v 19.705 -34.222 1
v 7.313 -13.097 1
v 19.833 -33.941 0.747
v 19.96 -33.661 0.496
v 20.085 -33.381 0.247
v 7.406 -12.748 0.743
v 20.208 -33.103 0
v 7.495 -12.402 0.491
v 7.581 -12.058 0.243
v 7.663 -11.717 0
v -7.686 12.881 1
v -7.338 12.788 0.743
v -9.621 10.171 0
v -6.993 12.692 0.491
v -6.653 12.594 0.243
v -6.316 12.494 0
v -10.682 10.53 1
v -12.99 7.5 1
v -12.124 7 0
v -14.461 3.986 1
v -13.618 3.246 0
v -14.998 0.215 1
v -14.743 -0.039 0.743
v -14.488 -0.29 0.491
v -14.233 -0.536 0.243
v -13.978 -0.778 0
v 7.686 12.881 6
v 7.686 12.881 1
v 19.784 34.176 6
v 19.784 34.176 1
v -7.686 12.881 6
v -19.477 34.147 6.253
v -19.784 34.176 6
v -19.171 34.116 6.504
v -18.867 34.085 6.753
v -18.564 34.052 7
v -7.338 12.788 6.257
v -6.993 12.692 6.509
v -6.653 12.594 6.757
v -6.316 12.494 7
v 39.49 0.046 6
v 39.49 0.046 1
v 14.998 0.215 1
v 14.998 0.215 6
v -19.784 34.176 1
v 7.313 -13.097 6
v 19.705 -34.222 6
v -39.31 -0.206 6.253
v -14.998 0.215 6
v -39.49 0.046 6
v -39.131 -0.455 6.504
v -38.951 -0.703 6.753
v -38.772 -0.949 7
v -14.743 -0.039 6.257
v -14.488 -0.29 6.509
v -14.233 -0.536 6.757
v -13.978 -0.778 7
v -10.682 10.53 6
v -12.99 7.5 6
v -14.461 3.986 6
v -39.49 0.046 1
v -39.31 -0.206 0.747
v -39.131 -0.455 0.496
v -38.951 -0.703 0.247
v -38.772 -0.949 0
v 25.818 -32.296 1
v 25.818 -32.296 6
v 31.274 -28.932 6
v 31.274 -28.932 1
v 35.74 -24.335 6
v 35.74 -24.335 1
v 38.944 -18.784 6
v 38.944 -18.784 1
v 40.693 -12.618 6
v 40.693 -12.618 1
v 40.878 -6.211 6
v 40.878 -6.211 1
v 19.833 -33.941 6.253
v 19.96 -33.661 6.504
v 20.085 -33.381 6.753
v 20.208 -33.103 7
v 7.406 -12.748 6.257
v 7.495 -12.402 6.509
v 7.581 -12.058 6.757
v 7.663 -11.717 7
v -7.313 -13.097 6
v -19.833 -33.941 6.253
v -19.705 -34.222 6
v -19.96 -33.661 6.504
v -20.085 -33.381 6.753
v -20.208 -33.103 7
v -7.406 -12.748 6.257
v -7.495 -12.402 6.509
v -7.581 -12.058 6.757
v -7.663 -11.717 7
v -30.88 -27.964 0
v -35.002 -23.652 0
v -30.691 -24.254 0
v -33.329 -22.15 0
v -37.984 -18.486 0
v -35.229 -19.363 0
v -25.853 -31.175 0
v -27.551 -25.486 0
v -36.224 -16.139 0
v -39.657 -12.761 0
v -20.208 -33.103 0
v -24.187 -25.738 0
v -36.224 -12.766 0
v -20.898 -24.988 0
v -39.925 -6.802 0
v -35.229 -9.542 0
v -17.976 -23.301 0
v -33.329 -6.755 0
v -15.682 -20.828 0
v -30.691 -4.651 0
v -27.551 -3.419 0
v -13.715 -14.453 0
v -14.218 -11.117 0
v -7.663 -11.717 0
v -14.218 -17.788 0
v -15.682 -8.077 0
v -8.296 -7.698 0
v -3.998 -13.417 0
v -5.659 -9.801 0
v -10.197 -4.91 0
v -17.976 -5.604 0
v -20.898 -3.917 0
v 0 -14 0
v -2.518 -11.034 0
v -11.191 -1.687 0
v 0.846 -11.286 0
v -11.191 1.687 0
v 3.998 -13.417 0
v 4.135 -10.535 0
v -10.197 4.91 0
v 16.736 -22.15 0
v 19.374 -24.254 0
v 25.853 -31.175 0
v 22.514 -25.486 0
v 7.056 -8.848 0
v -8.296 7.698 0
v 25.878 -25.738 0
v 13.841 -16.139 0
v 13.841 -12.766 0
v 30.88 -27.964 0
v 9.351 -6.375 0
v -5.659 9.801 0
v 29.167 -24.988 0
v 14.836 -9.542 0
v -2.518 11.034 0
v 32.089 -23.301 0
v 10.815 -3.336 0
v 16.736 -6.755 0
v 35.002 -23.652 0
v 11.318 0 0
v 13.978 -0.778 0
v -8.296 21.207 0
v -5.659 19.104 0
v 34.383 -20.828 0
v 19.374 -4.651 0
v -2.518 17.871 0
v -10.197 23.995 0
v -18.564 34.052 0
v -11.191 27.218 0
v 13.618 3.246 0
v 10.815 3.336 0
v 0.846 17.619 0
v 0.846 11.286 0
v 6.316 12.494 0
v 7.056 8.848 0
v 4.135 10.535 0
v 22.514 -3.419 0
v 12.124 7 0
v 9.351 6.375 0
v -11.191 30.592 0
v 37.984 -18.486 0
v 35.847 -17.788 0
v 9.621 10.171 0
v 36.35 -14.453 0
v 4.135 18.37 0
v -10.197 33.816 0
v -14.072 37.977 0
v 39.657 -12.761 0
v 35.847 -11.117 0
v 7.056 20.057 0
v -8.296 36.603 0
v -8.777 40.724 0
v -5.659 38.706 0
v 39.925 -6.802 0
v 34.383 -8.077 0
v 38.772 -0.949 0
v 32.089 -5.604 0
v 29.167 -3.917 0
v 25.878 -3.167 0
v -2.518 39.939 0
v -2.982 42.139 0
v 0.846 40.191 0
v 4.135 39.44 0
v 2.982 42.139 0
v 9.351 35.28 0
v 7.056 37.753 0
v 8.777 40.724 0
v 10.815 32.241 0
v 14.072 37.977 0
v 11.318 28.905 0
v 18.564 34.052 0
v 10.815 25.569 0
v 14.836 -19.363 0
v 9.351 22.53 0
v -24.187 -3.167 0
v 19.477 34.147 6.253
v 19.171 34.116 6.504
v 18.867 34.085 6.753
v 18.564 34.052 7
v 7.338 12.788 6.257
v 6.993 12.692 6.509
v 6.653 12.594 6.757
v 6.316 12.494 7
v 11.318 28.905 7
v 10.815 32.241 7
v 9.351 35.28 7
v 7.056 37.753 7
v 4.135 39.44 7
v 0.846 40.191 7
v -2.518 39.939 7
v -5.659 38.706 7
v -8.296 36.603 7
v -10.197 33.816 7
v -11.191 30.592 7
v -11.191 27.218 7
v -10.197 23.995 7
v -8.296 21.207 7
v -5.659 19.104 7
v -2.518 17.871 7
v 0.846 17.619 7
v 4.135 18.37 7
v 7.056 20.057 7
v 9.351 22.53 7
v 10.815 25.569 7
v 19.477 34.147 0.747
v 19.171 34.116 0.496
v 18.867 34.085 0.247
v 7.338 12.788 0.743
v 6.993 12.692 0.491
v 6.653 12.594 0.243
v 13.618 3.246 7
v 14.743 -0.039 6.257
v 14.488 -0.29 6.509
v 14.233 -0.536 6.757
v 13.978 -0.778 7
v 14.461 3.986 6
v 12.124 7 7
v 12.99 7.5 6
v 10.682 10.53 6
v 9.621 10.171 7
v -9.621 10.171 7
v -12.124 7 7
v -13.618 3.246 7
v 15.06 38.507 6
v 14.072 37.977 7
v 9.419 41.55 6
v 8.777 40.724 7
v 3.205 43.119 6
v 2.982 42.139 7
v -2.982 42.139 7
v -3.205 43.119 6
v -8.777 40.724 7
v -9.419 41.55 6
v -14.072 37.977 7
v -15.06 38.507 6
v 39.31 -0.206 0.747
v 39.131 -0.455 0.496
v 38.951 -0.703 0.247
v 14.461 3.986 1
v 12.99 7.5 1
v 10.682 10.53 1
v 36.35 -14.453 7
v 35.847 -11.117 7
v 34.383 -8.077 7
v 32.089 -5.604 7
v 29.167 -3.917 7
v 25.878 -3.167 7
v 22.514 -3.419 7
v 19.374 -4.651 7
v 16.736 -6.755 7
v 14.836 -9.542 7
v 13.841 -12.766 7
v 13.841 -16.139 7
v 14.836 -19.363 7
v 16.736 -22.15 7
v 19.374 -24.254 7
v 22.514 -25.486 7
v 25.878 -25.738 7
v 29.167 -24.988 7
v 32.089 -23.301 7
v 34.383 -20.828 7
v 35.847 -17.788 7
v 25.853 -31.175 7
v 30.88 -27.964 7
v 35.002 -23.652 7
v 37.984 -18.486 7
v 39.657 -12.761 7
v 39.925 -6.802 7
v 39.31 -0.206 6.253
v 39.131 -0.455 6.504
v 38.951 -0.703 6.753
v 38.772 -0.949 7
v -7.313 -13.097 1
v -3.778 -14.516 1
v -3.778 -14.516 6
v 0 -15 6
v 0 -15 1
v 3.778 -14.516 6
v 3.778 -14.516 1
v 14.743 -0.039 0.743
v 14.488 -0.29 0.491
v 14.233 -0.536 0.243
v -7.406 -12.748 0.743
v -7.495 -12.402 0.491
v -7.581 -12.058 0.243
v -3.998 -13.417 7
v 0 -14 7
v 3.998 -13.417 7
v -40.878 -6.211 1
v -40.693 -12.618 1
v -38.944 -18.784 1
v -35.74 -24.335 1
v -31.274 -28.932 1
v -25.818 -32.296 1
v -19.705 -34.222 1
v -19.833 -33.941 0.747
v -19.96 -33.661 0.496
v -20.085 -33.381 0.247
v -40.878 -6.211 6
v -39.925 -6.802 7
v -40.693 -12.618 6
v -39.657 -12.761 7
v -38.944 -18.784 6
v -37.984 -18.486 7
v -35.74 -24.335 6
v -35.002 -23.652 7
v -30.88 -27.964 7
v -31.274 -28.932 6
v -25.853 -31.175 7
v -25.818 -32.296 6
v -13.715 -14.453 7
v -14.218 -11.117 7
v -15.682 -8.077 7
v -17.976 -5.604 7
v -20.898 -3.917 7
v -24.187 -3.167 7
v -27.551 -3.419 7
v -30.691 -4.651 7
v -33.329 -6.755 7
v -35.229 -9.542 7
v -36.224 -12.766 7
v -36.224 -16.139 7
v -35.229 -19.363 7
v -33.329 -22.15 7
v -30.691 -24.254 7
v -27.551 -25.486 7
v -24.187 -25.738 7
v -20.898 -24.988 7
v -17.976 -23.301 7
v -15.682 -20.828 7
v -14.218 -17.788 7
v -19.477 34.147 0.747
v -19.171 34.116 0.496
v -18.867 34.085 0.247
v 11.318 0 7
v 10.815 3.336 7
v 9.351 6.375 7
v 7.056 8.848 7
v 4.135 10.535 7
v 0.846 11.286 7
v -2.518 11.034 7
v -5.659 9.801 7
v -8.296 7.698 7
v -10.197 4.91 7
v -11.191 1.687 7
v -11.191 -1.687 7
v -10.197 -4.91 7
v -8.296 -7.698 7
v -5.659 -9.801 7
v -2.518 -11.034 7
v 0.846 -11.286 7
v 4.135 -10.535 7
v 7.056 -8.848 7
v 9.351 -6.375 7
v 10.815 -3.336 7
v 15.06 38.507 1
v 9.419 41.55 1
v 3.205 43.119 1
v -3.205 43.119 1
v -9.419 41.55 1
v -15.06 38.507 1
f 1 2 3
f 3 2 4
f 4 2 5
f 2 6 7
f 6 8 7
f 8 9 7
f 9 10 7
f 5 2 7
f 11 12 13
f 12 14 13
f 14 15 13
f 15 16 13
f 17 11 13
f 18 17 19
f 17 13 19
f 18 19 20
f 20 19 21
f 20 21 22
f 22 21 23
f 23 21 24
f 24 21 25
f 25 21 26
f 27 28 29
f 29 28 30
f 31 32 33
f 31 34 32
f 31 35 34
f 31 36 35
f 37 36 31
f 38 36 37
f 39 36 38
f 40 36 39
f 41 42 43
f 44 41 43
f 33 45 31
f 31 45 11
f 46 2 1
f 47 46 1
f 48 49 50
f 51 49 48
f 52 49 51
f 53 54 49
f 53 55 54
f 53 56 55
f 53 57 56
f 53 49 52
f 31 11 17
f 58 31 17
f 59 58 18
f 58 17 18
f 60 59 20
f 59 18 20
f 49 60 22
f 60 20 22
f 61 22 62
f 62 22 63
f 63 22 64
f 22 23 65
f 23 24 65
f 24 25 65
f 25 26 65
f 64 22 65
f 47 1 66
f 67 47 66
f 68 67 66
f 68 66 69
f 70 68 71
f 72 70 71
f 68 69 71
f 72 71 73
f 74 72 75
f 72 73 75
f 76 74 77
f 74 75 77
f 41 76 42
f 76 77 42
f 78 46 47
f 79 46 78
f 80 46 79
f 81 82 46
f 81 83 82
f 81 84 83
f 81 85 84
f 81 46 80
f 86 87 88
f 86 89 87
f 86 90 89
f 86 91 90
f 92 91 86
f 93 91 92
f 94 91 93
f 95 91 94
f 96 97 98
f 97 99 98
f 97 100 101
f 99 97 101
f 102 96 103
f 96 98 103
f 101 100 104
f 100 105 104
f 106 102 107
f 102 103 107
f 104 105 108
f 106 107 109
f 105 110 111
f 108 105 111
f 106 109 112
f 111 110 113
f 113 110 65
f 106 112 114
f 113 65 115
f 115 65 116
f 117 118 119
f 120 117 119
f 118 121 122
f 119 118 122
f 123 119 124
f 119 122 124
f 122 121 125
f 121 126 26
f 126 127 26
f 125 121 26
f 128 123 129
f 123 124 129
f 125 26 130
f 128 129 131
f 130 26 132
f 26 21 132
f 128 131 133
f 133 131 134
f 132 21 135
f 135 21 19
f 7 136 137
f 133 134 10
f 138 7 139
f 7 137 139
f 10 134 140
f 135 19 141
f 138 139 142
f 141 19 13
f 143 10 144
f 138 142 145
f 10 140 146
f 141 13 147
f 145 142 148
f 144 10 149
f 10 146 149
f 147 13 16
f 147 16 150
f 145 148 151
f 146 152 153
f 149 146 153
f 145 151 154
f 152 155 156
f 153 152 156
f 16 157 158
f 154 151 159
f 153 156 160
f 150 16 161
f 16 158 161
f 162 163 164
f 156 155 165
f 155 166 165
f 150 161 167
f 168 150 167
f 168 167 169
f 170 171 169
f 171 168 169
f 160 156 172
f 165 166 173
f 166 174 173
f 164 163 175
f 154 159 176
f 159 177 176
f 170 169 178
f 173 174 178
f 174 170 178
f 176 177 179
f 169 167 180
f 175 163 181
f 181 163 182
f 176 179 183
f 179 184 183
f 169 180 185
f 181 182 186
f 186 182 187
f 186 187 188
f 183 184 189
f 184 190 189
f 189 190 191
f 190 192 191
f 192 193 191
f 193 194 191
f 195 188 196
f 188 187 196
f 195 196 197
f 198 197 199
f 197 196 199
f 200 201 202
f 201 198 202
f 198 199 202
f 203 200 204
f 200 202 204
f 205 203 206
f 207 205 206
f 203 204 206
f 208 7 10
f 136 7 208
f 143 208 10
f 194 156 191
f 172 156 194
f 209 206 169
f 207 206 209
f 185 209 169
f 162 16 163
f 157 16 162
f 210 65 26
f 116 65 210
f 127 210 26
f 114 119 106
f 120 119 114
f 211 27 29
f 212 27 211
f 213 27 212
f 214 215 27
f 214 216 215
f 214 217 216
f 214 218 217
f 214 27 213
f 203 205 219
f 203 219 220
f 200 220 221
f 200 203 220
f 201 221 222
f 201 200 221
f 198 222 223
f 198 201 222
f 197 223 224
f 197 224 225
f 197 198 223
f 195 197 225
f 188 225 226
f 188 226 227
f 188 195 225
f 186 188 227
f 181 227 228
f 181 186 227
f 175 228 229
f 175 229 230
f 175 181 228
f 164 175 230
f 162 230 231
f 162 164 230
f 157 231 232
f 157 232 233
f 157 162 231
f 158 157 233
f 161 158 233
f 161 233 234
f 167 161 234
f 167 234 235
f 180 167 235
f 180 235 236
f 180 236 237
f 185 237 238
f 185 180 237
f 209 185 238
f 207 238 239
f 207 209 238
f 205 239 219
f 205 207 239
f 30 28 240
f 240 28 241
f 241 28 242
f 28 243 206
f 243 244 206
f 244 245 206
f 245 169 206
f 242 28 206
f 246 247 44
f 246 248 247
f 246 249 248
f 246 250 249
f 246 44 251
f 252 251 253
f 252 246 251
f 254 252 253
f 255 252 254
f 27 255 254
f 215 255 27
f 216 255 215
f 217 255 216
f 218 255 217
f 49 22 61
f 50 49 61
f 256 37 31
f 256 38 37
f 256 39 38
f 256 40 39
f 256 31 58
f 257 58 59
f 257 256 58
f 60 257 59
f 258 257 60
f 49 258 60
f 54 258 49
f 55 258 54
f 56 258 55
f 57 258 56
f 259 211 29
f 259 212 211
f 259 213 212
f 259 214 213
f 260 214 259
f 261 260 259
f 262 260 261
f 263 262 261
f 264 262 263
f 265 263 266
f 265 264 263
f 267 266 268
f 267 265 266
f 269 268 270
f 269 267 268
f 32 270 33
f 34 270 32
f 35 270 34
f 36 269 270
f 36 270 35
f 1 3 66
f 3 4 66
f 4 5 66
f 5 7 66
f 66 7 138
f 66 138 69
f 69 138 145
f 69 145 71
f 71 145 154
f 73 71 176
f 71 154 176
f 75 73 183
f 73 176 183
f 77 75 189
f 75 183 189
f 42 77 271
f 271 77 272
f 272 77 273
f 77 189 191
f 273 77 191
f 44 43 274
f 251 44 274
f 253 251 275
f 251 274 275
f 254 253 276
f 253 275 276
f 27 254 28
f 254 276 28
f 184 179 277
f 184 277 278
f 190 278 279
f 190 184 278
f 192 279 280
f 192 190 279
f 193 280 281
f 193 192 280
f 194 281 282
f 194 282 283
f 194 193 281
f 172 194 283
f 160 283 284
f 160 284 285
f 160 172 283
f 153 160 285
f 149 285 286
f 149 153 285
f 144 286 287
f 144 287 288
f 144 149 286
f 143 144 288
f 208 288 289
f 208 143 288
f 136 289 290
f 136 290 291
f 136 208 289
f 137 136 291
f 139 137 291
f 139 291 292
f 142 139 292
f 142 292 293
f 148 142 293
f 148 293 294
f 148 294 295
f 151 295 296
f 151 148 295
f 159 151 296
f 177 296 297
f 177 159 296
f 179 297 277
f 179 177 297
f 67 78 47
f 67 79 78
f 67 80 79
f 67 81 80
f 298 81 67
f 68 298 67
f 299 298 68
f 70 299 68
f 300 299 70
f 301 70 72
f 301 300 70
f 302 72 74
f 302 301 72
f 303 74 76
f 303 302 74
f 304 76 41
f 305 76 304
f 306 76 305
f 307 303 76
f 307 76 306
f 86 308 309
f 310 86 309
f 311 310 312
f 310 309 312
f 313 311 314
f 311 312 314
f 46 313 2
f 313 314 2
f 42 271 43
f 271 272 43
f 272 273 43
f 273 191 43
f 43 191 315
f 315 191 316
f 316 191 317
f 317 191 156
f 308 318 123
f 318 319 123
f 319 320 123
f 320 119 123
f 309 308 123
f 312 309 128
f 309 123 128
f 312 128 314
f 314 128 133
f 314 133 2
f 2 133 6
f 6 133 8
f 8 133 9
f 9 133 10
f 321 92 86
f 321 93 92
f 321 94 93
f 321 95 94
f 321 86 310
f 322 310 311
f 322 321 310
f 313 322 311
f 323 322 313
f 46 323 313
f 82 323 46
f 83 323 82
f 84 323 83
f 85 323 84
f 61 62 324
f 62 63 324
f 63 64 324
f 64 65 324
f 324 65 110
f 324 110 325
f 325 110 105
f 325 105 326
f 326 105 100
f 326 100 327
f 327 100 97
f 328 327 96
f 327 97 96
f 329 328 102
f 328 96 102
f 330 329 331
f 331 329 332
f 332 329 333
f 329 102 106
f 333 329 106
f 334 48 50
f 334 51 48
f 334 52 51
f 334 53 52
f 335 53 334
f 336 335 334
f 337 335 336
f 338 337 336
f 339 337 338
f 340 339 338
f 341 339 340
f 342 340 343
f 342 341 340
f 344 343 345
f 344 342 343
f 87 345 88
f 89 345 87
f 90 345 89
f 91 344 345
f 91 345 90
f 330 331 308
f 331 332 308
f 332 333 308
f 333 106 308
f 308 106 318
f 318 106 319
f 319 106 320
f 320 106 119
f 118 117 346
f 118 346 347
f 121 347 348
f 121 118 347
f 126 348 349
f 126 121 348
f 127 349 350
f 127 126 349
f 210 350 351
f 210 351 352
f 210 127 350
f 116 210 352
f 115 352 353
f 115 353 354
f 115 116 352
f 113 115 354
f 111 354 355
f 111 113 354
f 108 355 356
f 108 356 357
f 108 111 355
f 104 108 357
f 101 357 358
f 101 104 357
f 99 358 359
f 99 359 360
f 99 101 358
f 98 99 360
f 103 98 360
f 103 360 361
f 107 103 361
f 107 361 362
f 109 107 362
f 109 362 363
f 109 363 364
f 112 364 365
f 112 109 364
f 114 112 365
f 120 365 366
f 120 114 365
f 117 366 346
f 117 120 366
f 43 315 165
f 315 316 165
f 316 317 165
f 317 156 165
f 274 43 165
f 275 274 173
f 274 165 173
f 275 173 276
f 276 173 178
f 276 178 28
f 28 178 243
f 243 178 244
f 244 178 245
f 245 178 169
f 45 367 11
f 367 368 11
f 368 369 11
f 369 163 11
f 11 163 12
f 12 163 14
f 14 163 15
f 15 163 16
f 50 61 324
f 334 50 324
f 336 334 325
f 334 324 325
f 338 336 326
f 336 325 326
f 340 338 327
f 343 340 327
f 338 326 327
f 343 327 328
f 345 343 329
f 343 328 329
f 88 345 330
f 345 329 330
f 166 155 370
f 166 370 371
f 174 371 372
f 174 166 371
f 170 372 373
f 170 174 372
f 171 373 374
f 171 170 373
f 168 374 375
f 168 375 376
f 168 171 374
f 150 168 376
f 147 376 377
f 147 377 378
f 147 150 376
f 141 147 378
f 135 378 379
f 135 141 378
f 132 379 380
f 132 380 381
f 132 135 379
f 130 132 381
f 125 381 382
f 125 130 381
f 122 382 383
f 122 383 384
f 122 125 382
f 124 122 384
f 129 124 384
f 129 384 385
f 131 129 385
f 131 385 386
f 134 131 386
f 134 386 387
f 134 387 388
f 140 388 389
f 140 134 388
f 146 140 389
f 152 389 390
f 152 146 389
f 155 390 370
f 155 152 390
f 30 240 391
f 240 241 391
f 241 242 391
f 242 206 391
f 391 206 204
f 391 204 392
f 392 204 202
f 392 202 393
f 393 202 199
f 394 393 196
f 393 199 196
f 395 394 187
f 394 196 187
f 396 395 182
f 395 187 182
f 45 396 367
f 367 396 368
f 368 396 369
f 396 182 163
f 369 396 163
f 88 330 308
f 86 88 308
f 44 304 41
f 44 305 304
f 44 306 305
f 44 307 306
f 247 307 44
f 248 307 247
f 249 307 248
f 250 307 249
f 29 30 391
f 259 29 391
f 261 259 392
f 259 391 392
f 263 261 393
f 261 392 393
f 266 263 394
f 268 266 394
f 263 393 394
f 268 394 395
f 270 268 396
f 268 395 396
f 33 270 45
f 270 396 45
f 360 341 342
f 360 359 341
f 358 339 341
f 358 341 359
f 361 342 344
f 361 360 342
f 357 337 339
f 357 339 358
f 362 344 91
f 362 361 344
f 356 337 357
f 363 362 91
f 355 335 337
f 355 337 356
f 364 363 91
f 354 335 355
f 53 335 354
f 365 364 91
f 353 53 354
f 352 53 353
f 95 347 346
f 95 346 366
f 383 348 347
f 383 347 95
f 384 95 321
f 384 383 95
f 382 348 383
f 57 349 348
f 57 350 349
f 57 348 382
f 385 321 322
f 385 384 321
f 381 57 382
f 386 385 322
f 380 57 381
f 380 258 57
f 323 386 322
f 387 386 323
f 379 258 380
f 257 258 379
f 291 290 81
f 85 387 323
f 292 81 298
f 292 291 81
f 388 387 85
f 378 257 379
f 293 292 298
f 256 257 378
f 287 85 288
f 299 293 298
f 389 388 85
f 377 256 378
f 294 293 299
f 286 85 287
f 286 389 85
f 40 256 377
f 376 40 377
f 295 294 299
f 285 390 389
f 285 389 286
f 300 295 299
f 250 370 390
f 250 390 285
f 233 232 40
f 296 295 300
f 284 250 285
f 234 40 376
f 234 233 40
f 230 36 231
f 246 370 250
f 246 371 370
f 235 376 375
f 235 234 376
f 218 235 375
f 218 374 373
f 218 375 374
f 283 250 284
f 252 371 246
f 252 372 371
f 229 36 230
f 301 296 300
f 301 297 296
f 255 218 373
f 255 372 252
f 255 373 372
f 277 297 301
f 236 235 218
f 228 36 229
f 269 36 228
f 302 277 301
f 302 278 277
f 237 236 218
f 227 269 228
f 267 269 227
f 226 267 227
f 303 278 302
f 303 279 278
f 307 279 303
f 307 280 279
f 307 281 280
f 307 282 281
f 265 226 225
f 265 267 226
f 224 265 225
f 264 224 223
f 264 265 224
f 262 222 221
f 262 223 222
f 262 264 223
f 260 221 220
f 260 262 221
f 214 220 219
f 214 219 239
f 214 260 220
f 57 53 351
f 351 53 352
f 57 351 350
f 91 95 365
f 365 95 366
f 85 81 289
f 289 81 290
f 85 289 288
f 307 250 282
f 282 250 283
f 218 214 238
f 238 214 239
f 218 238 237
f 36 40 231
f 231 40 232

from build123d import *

# Parameters (mm, degrees)
F0_R     = 11.3175
F1_DEPTH = 7
F2_SIZE  = 1


with BuildPart() as f1:
    # F0 (on Top) → F1 (new body)
    with BuildSketch(Plane.XY):
        with BuildLine():
            ThreePointArc((7.3127307082, -13.0967159849), (12.9362081118, -7.5930573347), (15, 0))
            ThreePointArc((15, 0), (14.9996135208, 0.1076764883), (14.9984541032, 0.2153474281))
            ThreePointArc((14.9984541032, 0.2153474281), (12.9903810568, 7.5), (7.6857233949, 12.8813685568))
            ThreePointArc((7.6857233949, 12.8813685568), (0, 15), (-7.6857233949, 12.8813685568))
            ThreePointArc((-7.6857233949, 12.8813685568), (-12.9903810568, 7.5), (-14.9984541032, 0.2153474281))
            ThreePointArc((-14.9984541032, 0.2153474281), (-12.9903810568, -7.5), (-7.3127307082, -13.0967159849))
            ThreePointArc((-7.3127307082, -13.0967159849), (0, -15), (7.3127307082, -13.0967159849))
        make_face()
        Circle(F0_R, mode=Mode.SUBTRACT)
        with BuildLine():
            ThreePointArc((14.9984541032, 0.2153474281), (14.9996135208, 0.1076764883), (15, 0))
            ThreePointArc((15, 0), (12.9362081118, -7.5930573347), (7.3127307082, -13.0967159849))
            Line((7.3127307082, -13.0967159849), (19.70522071, -34.2219280102))
            ThreePointArc((19.70522071, -34.2219280102), (37.513895389, -21.6586576012), (39.4896693783, 0.0457422831))
            Line((39.4896693783, 0.0457422831), (14.9984541032, 0.2153474281))
        make_face()
        with Locations((25.0325276728, -14.4525365904)):
            Circle(F0_R, mode=Mode.SUBTRACT)
        with BuildLine():
            ThreePointArc((-7.6857233949, 12.8813685568), (0, 15), (7.6857233949, 12.8813685568))
            Line((7.6857233949, 12.8813685568), (19.7844486684, 34.1761857271))
            ThreePointArc((19.7844486684, 34.1761857271), (0, 43.3173152024), (-19.7844486684, 34.1761857271))
            Line((-19.7844486684, 34.1761857271), (-7.6857233949, 12.8813685568))
        make_face()
        with Locations((0, 28.9050731808)):
            Circle(F0_R, mode=Mode.SUBTRACT)
        with BuildLine():
            Line((-19.70522071, -34.2219280102), (-7.3127307082, -13.0967159849))
            ThreePointArc((-7.3127307082, -13.0967159849), (-12.9903810568, -7.5), (-14.9984541032, 0.2153474281))
            Line((-14.9984541032, 0.2153474281), (-39.4896693783, 0.0457422831))
            ThreePointArc((-39.4896693783, 0.0457422831), (-37.513895389, -21.6586576012), (-19.70522071, -34.2219280102))
        make_face()
        with Locations((-25.0325276728, -14.4525365904)):
            Circle(F0_R, mode=Mode.SUBTRACT)
    extrude(amount=F1_DEPTH)

    # F2
    f2_edges = [f1.edges().sort_by_distance(p)[0] for p in [
        (-27.244062, 0.130545, 7),
        (-13.735086, 23.528777, 7),
        (27.244062, 0.130545, 7),
        (13.735086, 23.528777, 7),
        (13.508976, -23.659322, 7),
        (-13.508976, -23.659322, 7),
        (-37.513895, -21.658658, 7),
        (37.513895, -21.658658, 7),
        (0, 43.317315, 7),
        (-12.990381, 7.5, 7),
        (12.990381, 7.5, 7),
        (0, -15, 7),
        (0, -15, 0),
        (13.508976, -23.659322, 0),
        (-13.508976, -23.659322, 0),
        (37.513895, -21.658658, 0),
        (27.244062, 0.130545, 0),
        (12.990381, 7.5, 0),
        (13.735086, 23.528777, 0),
        (0, 43.317315, 0),
        (-13.735086, 23.528777, 0),
        (-12.990381, 7.5, 0),
        (-27.244062, 0.130545, 0),
        (-37.513895, -21.658658, 0),
    ]]
    chamfer(f2_edges, length=F2_SIZE)


solid = f1.part
